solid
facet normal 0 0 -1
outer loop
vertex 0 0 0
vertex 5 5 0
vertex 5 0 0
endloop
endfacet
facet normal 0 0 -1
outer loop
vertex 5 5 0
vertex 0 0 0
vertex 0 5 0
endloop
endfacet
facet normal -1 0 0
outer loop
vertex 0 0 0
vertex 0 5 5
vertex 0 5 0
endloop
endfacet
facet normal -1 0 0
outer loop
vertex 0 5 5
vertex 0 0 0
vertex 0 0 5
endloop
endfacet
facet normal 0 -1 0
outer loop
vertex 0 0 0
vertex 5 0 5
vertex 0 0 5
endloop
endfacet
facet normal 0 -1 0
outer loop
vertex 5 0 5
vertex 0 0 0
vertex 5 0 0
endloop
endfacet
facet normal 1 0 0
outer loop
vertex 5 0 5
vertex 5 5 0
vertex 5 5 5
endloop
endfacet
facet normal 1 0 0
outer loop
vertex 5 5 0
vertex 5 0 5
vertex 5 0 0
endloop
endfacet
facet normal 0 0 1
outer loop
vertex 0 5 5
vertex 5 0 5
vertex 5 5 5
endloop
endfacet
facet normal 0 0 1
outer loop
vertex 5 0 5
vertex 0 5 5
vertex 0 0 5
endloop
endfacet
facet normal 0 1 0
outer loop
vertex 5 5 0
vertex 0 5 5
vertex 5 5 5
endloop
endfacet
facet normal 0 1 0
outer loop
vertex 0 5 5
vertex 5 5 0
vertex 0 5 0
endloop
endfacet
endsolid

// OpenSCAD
cube(-1);
cube([1, 2]);
cube("a");
cube([1, -2, 3]);
cube(undef);
cube(0);
cube(center = "yes");
cube(size = [1, 2, 3], 5);
cube(1, 2, 3);
cube(sizee = 2);
